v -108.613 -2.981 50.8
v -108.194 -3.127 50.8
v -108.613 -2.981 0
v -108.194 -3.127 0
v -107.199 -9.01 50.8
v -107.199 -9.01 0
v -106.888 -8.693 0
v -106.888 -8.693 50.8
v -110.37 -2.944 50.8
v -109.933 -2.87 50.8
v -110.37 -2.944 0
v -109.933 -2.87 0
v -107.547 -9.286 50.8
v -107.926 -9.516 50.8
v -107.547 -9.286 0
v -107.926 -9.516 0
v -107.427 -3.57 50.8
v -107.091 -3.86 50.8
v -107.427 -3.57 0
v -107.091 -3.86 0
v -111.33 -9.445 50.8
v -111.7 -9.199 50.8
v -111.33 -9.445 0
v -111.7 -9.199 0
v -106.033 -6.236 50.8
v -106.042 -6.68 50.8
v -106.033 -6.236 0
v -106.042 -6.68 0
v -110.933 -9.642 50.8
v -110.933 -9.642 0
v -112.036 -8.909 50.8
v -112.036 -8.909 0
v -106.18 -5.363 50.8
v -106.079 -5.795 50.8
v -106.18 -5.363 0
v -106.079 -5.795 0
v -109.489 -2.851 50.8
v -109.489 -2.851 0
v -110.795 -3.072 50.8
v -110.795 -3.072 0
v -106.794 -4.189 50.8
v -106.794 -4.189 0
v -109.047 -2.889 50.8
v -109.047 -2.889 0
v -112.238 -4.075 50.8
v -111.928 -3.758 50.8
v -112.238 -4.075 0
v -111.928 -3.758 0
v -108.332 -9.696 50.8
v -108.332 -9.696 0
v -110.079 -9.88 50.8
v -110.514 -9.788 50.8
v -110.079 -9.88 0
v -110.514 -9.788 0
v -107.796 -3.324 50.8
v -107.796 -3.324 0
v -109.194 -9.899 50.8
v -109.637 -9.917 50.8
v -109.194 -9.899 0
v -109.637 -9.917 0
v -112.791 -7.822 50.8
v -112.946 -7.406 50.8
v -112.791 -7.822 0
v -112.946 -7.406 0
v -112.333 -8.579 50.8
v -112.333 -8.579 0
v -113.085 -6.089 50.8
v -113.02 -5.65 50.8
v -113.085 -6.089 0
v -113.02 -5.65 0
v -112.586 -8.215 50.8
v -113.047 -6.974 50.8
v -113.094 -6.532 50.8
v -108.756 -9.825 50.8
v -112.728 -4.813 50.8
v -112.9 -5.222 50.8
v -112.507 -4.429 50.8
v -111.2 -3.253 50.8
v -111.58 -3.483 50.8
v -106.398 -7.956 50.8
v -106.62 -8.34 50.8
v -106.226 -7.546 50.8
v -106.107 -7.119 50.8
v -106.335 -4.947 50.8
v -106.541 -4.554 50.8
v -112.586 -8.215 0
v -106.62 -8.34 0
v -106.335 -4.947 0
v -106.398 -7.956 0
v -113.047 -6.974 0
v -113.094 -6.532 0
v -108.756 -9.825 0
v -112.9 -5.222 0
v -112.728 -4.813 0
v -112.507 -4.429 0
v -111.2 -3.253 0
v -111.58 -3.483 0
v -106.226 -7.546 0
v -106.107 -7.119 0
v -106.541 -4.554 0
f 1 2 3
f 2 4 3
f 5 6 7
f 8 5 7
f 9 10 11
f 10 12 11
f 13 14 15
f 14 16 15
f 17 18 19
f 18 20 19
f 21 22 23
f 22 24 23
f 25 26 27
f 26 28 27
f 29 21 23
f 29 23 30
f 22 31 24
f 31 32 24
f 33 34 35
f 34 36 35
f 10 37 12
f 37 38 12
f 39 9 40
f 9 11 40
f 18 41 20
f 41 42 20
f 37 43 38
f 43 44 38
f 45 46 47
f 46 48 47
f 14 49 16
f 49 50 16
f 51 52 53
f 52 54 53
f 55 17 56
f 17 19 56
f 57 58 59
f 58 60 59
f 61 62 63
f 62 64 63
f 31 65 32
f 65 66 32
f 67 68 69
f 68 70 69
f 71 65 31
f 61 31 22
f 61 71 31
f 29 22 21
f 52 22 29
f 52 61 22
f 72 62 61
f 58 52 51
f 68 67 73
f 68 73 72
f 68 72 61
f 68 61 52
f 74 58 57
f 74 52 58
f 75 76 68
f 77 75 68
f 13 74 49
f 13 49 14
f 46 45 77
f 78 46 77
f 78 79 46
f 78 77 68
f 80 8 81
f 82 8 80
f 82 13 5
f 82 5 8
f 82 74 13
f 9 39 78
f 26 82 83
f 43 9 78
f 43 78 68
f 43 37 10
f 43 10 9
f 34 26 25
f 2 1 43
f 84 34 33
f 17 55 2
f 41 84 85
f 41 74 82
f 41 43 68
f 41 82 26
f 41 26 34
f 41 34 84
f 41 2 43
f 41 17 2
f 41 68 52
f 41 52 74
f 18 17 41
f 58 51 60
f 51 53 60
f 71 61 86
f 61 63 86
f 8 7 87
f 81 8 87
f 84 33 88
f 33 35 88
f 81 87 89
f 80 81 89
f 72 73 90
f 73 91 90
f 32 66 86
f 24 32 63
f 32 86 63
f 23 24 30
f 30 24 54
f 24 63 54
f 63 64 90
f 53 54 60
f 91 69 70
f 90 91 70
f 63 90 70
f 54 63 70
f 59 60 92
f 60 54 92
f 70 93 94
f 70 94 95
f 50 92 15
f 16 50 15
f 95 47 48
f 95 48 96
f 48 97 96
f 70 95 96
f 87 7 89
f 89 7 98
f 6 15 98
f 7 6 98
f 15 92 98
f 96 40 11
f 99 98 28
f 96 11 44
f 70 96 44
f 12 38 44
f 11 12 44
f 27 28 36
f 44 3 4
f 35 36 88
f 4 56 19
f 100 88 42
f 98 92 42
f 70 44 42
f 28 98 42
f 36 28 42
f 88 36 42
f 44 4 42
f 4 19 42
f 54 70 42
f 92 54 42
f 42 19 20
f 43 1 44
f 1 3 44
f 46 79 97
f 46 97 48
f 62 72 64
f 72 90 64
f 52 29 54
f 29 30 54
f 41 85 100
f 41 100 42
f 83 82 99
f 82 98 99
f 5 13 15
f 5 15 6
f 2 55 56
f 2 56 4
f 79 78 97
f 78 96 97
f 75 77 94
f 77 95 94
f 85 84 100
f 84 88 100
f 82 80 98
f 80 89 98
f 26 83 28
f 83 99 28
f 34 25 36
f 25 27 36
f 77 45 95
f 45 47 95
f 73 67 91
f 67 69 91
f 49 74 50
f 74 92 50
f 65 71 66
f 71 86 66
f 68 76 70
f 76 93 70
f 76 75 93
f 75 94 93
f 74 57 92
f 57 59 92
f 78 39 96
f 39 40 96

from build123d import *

# Parameters (mm, degrees)
F1_DEPTH = 25.4
F2_DEPTH = 25.4


with BuildPart() as f1:
    # F0 (on Top) → F1 (new body)
    with BuildSketch(Plane.XY):
        Polygon((-106.6199785918, -8.3398267185), (-106.3980976938, -7.9555177299), (-106.2261330812, -7.546430082), (-106.1067967386, -7.1190153315), (-106.0419706715, -6.6800140643), (-106.0326772256, -6.2363495925), (-106.0790629642, -5.7950187701), (-106.1803963564, -5.3629816475), (-106.3350793142, -4.9470517085), (-106.5406723948, -4.5537884165), (-106.7939332727, -4.1893937687), (-107.0908678723, -3.8596144862), (-107.4267933578, -3.5696513854), (-107.7964119835, -3.3240773576), (-108.193894643, -3.1267652519), (-108.6129727972, -2.9808267981), (-109.0470373333, -2.8885635328), (-109.4892427942, -2.8514305027), (-109.9326153358, -2.870013318), (-110.3701627081, -2.9440189166), (-110.7949845277, -3.0722801859), (-111.2003811007, -3.2527743692), (-111.579959081, -3.4826549652), (-111.9277322972, -3.7582966198), (-112.2382161578, -4.0753522993), (-112.5065141469, -4.4288218464), (-112.7283950449, -4.8131308349), (-112.9003596576, -5.2222184828), (-113.0196960001, -5.6496332333), (-113.0845220673, -6.0886345005), (-113.0938155131, -6.5322989723), (-113.0474297745, -6.9736297948), (-112.9460963823, -7.4056669173), (-112.7914134245, -7.8215968563), (-112.5858203439, -8.2148601483), (-112.3325594661, -8.5792547962), (-112.0356248664, -8.9090340786), (-111.6996993809, -9.1989971794), (-111.3300807552, -9.4445712072), (-110.9325980957, -9.6418833129), (-110.5135199415, -9.7878217667), (-110.0794554055, -9.8800850321), (-109.6372499445, -9.9172180621), (-109.193877403, -9.8986352468), (-108.7563300307, -9.8246296482), (-108.3315082111, -9.6963683789), (-107.926111638, -9.5158741957), (-107.5465336577, -9.2859935996), (-107.1987604415, -9.010351945), (-106.8882765809, -8.6932962655), align=None)
    extrude(amount=F1_DEPTH)

    # F2 (add): a face of the model
    f2_faces = [f1.faces().sort_by_distance(p)[0] for p in [
        (-109.5632463694, -6.3843242824, 25.4),
    ]]
    extrude(f2_faces, amount=F2_DEPTH)


solid = f1.part
